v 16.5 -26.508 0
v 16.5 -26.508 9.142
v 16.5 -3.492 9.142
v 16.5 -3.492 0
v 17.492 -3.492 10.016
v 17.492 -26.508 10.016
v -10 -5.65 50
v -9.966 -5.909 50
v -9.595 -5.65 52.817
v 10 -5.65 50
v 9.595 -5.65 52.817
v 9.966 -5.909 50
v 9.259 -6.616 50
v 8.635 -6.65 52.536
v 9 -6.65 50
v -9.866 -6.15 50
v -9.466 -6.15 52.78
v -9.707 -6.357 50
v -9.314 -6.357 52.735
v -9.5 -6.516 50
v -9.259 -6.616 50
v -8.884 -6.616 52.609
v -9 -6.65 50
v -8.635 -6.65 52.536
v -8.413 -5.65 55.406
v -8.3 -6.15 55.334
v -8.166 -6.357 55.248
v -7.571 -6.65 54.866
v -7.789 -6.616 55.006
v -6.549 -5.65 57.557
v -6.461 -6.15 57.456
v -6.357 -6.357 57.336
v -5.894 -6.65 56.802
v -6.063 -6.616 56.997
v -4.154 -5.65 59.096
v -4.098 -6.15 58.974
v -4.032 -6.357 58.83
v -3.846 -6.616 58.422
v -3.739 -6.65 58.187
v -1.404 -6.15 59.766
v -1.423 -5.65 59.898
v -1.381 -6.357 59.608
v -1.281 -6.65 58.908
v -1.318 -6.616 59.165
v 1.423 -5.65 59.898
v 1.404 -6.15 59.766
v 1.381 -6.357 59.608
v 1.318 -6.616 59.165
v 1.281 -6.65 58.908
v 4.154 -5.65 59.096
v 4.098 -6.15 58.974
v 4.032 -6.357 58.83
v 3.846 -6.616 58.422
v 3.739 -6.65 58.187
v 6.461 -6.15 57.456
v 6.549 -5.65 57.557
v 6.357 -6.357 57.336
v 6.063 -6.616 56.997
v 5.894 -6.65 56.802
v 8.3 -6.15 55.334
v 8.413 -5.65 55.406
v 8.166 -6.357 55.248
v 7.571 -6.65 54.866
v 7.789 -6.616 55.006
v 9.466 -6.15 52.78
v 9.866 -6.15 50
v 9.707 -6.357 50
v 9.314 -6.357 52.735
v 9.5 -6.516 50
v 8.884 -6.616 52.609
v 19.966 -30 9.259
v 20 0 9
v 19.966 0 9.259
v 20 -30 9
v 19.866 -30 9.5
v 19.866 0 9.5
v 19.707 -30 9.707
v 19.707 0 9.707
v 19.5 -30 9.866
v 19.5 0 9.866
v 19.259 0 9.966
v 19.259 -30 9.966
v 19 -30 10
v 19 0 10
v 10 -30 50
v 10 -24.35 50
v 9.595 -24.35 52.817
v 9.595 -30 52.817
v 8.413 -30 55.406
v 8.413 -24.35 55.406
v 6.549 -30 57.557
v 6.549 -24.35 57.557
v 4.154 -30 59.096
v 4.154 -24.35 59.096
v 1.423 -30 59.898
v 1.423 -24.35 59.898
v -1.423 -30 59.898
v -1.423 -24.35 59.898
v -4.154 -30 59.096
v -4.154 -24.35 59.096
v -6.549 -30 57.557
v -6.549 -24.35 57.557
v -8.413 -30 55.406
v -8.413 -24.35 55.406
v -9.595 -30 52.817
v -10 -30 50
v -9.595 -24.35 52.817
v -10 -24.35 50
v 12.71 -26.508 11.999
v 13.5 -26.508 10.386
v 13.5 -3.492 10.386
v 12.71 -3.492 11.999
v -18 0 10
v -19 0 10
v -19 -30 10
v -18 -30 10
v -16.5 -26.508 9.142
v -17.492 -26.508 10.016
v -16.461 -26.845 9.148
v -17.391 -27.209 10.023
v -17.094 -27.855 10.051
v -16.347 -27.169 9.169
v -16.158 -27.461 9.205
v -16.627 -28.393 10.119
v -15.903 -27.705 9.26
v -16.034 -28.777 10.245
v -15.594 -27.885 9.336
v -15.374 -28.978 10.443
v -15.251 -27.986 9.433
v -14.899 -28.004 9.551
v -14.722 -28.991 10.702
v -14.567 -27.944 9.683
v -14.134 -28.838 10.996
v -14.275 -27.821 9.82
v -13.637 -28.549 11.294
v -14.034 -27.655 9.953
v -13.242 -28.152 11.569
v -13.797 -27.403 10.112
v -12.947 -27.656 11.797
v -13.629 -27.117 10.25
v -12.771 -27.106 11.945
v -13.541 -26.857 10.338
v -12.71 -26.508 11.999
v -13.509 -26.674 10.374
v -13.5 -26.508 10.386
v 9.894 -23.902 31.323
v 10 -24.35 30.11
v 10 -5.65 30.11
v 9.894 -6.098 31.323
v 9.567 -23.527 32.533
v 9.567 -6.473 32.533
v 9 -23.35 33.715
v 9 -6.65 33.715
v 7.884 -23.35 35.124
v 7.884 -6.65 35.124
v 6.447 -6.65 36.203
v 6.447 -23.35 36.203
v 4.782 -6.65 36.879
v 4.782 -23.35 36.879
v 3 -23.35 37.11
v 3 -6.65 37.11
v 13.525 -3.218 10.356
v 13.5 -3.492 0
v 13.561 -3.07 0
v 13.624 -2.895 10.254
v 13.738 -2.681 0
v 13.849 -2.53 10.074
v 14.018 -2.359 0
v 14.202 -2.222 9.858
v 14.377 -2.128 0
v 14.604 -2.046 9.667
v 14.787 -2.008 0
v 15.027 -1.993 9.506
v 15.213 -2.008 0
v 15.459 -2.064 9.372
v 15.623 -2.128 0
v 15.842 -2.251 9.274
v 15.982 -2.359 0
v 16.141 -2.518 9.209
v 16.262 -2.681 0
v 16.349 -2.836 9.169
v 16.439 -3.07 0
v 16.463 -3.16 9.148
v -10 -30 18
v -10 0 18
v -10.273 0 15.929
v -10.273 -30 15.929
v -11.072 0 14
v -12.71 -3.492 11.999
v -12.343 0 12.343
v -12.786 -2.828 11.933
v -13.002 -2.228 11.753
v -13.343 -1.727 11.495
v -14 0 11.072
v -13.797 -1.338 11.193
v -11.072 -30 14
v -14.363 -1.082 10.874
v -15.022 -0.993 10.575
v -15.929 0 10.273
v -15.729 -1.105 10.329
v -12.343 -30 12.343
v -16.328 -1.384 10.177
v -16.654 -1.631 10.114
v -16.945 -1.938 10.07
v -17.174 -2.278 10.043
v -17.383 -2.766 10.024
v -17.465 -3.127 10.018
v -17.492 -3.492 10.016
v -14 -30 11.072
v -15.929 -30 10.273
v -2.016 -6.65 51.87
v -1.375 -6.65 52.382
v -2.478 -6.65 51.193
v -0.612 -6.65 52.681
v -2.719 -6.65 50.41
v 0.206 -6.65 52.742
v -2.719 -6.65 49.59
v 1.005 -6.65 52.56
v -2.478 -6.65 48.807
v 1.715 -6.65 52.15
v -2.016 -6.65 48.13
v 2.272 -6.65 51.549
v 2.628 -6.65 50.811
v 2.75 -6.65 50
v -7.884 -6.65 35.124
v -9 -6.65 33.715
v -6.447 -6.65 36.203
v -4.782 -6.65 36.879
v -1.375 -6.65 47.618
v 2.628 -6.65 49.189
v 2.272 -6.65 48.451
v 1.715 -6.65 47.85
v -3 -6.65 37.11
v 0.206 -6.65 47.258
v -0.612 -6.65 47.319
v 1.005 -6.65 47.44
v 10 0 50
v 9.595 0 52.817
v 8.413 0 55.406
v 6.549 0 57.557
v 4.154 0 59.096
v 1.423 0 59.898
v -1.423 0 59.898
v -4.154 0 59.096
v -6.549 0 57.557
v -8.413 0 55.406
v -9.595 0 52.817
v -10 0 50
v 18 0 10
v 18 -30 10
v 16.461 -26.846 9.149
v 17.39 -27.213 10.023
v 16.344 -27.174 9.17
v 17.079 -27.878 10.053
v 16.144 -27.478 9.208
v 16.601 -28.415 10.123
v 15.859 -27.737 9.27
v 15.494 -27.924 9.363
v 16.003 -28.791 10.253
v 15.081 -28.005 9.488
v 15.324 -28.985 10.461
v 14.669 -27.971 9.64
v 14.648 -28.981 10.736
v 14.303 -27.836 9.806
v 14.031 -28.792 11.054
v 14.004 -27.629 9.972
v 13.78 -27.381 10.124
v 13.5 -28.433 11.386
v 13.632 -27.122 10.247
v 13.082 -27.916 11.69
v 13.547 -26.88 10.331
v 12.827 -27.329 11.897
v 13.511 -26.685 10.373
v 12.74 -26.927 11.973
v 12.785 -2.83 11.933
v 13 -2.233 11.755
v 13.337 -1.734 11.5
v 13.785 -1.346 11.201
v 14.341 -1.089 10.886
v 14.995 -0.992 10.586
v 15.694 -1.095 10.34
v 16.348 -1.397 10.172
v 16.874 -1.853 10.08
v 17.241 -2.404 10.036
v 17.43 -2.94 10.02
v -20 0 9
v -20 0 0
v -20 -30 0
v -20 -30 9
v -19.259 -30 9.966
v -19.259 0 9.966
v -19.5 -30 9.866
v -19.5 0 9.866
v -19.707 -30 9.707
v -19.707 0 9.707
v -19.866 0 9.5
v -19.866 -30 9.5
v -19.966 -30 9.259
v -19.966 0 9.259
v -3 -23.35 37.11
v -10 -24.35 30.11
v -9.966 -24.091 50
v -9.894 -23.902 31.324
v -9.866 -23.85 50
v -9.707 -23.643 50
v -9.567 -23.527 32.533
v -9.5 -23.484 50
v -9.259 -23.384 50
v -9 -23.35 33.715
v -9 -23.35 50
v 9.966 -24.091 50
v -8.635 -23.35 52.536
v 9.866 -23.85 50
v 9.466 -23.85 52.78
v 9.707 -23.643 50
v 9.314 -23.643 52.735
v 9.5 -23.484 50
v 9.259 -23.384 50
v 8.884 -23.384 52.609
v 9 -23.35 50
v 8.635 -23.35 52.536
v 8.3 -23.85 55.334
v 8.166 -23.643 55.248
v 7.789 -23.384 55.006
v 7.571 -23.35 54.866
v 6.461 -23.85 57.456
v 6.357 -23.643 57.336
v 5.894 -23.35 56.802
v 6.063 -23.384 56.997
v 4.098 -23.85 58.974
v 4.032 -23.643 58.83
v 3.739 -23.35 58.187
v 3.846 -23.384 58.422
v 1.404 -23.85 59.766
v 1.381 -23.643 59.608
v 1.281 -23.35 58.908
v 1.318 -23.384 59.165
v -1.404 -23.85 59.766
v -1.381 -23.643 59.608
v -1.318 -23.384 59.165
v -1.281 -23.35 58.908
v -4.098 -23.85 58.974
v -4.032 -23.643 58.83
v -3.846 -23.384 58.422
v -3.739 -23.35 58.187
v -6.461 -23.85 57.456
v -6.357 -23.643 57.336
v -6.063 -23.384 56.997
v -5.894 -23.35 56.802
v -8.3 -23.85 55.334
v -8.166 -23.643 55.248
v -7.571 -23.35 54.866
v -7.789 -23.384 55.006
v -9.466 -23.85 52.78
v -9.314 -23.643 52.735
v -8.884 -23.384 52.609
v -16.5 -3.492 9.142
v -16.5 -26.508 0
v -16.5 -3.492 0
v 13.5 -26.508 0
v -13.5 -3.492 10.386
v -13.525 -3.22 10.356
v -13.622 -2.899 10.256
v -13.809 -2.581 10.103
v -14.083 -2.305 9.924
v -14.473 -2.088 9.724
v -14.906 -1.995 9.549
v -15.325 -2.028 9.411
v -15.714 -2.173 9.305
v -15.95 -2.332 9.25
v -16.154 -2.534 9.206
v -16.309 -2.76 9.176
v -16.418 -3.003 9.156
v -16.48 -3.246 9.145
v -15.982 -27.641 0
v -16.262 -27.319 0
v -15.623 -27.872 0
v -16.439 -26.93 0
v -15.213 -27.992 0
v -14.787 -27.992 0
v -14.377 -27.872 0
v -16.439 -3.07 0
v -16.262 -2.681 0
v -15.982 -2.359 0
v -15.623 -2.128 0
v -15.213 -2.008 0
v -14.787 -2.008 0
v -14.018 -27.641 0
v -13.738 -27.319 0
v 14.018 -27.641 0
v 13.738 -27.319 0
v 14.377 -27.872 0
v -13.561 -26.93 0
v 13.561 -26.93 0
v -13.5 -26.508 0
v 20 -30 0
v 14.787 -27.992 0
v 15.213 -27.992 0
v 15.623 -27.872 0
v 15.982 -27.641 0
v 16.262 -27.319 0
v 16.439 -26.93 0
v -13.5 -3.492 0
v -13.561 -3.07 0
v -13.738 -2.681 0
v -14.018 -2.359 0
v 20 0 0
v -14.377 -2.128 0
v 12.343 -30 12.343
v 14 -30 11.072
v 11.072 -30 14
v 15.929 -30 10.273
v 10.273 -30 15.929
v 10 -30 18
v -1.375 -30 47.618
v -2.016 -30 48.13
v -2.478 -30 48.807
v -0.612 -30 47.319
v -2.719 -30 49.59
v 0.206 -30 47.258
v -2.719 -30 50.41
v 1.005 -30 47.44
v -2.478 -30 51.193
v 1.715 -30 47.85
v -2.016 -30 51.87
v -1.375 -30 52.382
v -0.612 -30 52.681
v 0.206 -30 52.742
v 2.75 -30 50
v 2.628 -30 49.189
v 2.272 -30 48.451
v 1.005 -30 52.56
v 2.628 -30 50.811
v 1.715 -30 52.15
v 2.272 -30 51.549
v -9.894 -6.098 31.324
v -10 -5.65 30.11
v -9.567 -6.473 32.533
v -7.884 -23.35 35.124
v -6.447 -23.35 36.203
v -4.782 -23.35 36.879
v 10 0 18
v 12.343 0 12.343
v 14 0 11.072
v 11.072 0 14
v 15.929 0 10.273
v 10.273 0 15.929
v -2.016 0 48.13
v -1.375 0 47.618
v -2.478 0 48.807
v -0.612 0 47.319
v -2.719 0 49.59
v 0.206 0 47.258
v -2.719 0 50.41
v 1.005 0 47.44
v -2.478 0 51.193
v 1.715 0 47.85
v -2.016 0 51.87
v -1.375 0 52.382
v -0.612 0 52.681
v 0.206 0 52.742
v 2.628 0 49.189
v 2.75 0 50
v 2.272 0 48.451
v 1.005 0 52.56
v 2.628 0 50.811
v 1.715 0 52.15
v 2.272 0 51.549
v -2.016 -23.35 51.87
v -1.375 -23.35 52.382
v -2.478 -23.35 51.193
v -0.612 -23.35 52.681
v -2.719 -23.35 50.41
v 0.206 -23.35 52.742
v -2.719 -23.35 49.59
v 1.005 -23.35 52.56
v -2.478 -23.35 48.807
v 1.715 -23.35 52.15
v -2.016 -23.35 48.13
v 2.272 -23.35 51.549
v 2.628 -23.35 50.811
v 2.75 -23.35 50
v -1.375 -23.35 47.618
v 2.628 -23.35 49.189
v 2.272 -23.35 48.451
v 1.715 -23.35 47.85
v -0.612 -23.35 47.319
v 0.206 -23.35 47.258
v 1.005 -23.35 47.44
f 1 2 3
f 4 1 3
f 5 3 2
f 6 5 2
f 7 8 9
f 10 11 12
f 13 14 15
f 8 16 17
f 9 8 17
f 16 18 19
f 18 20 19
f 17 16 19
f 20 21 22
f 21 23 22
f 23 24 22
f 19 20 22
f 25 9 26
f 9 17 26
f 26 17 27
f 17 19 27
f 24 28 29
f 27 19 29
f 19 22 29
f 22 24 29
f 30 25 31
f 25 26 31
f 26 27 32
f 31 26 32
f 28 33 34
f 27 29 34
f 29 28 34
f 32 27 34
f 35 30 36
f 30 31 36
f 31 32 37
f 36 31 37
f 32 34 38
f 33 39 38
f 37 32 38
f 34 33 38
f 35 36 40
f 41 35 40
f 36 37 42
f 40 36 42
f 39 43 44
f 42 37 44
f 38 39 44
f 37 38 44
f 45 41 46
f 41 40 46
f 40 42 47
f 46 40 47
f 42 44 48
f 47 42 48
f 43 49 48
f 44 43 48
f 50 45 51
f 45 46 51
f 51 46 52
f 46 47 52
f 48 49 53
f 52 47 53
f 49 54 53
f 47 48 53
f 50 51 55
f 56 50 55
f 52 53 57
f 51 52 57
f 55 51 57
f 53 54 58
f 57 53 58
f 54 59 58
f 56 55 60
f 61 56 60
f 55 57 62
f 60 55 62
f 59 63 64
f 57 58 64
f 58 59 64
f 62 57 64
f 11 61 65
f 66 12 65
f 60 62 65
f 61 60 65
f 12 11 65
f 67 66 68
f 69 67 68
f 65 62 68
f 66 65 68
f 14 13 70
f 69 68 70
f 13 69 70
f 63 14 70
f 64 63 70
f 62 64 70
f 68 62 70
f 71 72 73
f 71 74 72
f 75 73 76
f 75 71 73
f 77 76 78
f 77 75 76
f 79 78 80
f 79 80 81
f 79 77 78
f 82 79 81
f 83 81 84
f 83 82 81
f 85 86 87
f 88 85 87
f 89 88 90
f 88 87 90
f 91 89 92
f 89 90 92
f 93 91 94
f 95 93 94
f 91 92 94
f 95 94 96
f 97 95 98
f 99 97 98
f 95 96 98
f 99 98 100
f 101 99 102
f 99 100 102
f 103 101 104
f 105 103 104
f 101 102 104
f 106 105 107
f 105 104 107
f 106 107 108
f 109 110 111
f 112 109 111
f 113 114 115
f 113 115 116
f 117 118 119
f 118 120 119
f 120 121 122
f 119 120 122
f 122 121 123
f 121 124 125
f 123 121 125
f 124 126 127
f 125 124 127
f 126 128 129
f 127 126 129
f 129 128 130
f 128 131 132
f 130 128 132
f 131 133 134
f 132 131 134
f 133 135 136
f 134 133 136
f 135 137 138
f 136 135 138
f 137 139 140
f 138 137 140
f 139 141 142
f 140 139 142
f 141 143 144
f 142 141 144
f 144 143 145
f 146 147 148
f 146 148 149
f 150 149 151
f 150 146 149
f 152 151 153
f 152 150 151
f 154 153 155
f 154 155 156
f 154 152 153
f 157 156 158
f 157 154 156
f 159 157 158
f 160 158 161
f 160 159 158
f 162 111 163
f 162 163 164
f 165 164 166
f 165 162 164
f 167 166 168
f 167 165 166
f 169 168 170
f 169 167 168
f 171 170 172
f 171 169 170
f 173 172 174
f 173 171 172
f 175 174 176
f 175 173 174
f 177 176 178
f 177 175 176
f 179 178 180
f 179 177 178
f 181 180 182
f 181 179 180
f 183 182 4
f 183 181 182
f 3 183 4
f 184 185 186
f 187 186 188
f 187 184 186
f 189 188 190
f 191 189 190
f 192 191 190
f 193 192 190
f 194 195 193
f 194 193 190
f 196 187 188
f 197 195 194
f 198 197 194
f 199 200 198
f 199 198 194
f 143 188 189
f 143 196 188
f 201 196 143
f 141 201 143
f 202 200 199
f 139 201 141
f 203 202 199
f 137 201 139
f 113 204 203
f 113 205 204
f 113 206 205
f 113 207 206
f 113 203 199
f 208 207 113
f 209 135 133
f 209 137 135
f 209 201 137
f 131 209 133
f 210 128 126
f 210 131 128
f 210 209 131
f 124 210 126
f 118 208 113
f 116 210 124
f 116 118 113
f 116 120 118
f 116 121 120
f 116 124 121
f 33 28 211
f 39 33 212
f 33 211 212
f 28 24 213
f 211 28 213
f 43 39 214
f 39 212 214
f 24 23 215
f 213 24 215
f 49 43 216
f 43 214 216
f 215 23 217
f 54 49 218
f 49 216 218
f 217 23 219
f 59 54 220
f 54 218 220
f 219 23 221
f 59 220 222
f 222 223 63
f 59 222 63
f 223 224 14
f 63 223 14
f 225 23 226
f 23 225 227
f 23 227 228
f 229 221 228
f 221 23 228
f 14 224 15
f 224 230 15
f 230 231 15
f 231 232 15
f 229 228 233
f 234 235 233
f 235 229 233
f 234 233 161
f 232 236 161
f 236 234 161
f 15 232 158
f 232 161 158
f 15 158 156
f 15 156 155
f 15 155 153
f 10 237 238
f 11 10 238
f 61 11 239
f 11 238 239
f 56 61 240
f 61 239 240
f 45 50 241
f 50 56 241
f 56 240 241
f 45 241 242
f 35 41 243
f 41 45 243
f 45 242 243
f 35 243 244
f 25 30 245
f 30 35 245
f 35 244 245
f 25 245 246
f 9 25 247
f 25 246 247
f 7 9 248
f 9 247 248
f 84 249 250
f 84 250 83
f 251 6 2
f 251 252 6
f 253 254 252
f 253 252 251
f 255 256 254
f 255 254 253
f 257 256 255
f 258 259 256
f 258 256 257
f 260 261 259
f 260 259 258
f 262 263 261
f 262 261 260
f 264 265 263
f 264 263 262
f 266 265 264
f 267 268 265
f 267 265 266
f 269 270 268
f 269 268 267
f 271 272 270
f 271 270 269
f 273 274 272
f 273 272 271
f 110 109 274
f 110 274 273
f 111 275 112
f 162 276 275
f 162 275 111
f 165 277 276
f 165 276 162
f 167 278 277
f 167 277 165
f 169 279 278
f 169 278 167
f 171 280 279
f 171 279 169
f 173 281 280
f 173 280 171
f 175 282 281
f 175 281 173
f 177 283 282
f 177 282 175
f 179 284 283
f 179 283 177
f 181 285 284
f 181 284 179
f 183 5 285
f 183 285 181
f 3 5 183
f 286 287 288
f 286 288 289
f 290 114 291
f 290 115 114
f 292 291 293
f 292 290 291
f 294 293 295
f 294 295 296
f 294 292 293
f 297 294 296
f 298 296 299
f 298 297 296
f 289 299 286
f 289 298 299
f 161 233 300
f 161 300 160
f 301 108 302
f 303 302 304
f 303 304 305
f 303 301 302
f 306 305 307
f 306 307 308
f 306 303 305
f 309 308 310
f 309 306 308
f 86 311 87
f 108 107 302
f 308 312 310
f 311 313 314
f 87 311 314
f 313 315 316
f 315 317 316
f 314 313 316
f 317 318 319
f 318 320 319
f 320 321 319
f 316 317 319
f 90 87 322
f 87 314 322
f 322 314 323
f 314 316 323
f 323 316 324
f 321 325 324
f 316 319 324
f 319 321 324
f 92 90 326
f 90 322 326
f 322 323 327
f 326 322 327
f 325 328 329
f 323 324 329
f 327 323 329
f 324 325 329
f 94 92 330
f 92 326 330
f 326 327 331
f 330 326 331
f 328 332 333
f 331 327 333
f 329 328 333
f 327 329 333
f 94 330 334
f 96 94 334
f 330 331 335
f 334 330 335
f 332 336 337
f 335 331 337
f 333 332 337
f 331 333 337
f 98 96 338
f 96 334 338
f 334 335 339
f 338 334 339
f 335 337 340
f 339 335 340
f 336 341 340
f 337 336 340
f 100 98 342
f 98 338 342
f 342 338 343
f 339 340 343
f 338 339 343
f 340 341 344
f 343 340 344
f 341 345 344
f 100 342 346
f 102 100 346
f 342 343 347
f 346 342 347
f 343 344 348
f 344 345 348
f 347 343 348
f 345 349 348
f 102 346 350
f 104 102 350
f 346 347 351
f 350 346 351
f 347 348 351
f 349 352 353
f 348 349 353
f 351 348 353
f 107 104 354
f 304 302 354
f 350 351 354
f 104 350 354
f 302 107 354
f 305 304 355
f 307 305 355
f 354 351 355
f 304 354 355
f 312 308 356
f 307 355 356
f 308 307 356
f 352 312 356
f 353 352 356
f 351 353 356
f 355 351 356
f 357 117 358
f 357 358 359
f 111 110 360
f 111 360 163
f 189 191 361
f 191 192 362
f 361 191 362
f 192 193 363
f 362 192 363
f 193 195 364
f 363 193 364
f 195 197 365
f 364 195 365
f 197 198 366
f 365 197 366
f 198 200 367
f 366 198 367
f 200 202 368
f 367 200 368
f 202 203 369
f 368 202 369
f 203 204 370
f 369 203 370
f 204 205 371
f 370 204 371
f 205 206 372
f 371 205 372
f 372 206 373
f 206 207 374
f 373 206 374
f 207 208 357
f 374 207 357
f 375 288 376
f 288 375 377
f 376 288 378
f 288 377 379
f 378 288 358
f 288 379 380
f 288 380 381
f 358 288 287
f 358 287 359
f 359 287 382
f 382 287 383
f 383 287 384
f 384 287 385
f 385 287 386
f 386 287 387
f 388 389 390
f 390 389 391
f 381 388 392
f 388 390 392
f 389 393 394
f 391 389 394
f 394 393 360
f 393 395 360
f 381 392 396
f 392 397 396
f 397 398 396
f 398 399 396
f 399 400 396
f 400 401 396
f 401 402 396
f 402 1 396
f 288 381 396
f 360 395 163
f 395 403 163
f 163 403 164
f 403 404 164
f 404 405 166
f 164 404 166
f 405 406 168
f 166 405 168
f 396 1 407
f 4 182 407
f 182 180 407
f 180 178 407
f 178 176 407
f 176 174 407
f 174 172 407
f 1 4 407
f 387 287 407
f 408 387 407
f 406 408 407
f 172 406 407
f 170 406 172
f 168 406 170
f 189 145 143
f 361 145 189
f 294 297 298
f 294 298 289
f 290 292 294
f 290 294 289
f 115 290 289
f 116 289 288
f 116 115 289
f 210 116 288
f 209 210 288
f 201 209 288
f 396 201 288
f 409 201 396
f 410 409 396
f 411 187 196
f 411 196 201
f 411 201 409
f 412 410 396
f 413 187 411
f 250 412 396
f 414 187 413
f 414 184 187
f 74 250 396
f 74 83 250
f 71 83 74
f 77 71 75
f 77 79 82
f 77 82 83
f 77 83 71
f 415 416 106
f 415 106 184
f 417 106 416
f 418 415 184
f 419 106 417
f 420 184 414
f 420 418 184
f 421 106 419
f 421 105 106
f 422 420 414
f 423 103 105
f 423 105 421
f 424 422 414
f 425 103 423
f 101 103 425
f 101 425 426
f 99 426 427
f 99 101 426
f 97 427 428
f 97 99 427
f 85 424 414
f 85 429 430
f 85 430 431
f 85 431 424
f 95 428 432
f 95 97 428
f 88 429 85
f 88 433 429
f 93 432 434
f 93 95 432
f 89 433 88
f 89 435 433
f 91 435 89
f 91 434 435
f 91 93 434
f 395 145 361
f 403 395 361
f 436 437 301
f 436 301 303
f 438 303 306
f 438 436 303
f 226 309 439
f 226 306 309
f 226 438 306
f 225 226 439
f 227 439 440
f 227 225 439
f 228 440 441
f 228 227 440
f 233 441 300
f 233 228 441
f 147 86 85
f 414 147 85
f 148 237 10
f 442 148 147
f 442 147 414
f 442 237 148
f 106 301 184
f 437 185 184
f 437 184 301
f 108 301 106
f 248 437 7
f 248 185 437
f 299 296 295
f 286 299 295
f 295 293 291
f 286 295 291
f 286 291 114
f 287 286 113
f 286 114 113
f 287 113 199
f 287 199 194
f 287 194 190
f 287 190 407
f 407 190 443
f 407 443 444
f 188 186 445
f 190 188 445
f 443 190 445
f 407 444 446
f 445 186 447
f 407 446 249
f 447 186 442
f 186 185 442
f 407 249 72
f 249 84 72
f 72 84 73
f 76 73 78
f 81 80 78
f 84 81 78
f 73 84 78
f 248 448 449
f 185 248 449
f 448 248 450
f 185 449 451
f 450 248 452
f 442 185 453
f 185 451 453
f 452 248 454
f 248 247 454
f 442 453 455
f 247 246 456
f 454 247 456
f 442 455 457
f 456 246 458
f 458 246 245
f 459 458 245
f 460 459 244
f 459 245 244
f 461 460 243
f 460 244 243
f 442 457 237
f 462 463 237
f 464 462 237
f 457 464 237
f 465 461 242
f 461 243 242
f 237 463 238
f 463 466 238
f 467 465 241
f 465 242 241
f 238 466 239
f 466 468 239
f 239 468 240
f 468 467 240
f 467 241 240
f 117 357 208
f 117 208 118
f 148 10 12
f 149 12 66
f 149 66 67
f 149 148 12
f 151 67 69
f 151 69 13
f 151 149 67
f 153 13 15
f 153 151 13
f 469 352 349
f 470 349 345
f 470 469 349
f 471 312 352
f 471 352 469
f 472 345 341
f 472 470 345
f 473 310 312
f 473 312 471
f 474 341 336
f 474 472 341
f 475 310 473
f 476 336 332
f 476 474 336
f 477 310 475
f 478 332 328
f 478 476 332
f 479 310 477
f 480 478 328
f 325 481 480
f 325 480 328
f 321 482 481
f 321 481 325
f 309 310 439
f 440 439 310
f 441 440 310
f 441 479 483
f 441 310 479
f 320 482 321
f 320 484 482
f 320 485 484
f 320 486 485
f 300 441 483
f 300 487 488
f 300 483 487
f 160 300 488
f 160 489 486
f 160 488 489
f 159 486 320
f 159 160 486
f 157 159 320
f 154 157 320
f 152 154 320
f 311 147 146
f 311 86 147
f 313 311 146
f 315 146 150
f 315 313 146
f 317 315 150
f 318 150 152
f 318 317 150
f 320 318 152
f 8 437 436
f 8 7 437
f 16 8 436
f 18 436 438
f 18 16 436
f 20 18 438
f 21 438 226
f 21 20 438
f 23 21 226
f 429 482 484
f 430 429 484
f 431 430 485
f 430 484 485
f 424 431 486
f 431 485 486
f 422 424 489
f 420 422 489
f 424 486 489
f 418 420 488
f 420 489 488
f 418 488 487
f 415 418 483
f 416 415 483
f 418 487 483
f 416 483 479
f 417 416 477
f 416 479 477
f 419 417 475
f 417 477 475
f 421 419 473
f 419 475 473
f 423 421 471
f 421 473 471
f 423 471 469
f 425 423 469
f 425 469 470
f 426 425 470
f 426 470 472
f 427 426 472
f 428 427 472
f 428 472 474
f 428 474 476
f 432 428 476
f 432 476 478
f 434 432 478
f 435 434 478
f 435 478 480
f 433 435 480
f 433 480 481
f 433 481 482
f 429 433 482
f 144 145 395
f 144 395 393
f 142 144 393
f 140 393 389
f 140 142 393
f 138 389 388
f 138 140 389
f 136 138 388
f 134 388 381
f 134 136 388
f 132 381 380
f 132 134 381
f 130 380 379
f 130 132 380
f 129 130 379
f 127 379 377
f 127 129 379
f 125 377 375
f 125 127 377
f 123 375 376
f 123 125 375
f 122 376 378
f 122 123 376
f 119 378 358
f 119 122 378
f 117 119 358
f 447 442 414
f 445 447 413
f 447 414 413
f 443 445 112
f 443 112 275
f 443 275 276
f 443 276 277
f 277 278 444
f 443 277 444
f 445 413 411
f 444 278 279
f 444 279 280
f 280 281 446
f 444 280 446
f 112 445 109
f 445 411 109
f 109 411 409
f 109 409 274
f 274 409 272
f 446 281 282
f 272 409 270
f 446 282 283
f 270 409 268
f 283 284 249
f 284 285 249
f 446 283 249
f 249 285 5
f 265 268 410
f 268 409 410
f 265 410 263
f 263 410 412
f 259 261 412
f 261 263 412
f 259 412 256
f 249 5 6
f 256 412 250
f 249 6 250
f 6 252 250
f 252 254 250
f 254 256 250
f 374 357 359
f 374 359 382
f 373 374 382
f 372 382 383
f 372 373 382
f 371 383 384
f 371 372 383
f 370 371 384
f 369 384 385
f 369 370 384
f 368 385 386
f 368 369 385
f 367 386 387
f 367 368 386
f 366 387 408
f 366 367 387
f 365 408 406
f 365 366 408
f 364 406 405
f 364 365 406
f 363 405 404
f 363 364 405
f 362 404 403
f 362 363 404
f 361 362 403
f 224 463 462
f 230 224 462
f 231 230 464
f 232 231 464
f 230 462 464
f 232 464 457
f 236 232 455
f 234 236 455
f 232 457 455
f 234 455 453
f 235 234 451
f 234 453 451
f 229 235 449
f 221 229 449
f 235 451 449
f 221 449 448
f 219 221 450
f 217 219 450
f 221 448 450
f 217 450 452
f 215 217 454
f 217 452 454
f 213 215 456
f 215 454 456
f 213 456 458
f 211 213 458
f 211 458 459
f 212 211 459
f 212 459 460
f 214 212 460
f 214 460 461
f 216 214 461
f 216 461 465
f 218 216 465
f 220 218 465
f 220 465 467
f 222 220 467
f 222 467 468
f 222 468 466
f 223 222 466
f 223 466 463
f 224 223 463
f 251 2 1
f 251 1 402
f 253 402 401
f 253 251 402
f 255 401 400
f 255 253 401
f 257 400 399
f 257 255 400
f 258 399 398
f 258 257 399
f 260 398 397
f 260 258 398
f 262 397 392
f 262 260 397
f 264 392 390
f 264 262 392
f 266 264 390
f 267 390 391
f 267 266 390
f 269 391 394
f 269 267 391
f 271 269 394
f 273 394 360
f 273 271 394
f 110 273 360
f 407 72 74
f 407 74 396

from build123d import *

# Parameters (mm, degrees)
PAD_DEPTH       = 30
SKETCH001_W     = 41.77589
SKETCH001_H     = 25.780136
POCKET_DEPTH    = 8.35
SKETCH002_R     = 2.75
POCKET001_DEPTH = 30.001
FILLET_R        = 7
FILLET001_R     = 8
FILLET002_R     = 1
POCKET002_DEPTH = 16.001
CHAMFER_SIZE    = 1
FILLET003_R     = 1


with BuildPart() as part:
    # Sketch → Pad (new body)
    with BuildSketch(Plane.XZ):
        with BuildLine():
            Line((-20, 0), (20, 0))
            Line((20, 10), (20, 0))
            Line((10, 10), (20, 10))
            Line((10, 50), (10, 10))
            ThreePointArc((10, 50), (0, 60), (-10, 50))
            Line((-10, 10), (-10, 50))
            Line((-20, 10), (-10, 10))
            Line((-20, 0), (-20, 10))
        make_face()
    extrude(amount=PAD_DEPTH)

    # Sketch001 (on DatumPlane) → Pocket (cut, symmetric)
    with BuildSketch(Plane(origin=(0, -15, 0), x_dir=(1, 0, 0), z_dir=(0, 1, 0))):
        with Locations((0, -50)):
            Rectangle(SKETCH001_W, SKETCH001_H)
    extrude(amount=POCKET_DEPTH, both=True, mode=Mode.SUBTRACT)

    # Sketch002 (on Face4 of Pocket) → Pocket001 (cut, through all)
    with BuildSketch(Plane(origin=(0, 0, 0), x_dir=(1, 0, 0), z_dir=(0, 1, 0))):
        with Locations((0, -50)):
            Circle(SKETCH002_R)
    extrude(amount=-POCKET001_DEPTH, mode=Mode.SUBTRACT)

    # Fillet
    fillet_edges = [part.edges().sort_by_distance(p)[0] for p in [
        (-10, -15, 37.109932),
        (10, -15, 37.109932),
    ]]
    fillet(fillet_edges, radius=FILLET_R)

    # Fillet001
    fillet001_edges = [part.edges().sort_by_distance(p)[0] for p in [
        (10, -15, 10),
        (-10, -15, 10),
    ]]
    fillet(fillet001_edges, radius=FILLET001_R)

    # Fillet002
    fillet002_edges = [part.edges().sort_by_distance(p)[0] for p in [
        (-20, -15, 10),
        (20, -15, 10),
    ]]
    fillet(fillet002_edges, radius=FILLET002_R)

    # Sketch003 (on DatumPlane) → Pocket002 (cut, through all)
    with BuildSketch(Plane(origin=(0, 0, 16), x_dir=(1, 0, 0), z_dir=(0, 0, -1))):
        with BuildLine():
            ThreePointArc((16.5, 26.507559), (15, 28.007559), (13.5, 26.507559))
            Line((13.5, 26.507559), (13.5, 3.492441))
            ThreePointArc((13.5, 3.492441), (15, 1.992441), (16.5, 3.492441))
            Line((16.5, 26.507559), (16.5, 3.492441))
        make_face()
        with BuildLine():
            ThreePointArc((-13.5, 26.507559), (-15, 28.007559), (-16.5, 26.507559))
            Line((-16.5, 26.507559), (-16.5, 3.49244))
            ThreePointArc((-16.5, 3.49244), (-15, 1.99244), (-13.5, 3.49244))
            Line((-13.5, 26.507559), (-13.5, 3.49244))
        make_face()
    extrude(amount=POCKET002_DEPTH, mode=Mode.SUBTRACT)

    # Chamfer
    chamfer_edges = [part.edges().sort_by_distance(p)[0] for p in [
        (-16.5, -15, 10.141883),
        (-13.5, -15, 11.385622),
        (-14.95623, -1.993079, 10.601658),
        (-14.95623, -28.00692, 10.601658),
        (14.95623, -1.99308, 10.601658),
        (13.5, -15, 11.385622),
        (16.5, -15, 10.141883),
        (14.95623, -28.00692, 10.601658),
    ]]
    chamfer(chamfer_edges, length=CHAMFER_SIZE)

    # Fillet003
    fillet003_edges = [part.edges().sort_by_distance(p)[0] for p in [
        (-10, -23.35, 43.554966),
        (10, -23.35, 43.554966),
        (-10, -6.65, 43.554966),
        (10, -6.65, 43.554966),
    ]]
    fillet(fillet003_edges, radius=FILLET003_R)


solid = part.part
